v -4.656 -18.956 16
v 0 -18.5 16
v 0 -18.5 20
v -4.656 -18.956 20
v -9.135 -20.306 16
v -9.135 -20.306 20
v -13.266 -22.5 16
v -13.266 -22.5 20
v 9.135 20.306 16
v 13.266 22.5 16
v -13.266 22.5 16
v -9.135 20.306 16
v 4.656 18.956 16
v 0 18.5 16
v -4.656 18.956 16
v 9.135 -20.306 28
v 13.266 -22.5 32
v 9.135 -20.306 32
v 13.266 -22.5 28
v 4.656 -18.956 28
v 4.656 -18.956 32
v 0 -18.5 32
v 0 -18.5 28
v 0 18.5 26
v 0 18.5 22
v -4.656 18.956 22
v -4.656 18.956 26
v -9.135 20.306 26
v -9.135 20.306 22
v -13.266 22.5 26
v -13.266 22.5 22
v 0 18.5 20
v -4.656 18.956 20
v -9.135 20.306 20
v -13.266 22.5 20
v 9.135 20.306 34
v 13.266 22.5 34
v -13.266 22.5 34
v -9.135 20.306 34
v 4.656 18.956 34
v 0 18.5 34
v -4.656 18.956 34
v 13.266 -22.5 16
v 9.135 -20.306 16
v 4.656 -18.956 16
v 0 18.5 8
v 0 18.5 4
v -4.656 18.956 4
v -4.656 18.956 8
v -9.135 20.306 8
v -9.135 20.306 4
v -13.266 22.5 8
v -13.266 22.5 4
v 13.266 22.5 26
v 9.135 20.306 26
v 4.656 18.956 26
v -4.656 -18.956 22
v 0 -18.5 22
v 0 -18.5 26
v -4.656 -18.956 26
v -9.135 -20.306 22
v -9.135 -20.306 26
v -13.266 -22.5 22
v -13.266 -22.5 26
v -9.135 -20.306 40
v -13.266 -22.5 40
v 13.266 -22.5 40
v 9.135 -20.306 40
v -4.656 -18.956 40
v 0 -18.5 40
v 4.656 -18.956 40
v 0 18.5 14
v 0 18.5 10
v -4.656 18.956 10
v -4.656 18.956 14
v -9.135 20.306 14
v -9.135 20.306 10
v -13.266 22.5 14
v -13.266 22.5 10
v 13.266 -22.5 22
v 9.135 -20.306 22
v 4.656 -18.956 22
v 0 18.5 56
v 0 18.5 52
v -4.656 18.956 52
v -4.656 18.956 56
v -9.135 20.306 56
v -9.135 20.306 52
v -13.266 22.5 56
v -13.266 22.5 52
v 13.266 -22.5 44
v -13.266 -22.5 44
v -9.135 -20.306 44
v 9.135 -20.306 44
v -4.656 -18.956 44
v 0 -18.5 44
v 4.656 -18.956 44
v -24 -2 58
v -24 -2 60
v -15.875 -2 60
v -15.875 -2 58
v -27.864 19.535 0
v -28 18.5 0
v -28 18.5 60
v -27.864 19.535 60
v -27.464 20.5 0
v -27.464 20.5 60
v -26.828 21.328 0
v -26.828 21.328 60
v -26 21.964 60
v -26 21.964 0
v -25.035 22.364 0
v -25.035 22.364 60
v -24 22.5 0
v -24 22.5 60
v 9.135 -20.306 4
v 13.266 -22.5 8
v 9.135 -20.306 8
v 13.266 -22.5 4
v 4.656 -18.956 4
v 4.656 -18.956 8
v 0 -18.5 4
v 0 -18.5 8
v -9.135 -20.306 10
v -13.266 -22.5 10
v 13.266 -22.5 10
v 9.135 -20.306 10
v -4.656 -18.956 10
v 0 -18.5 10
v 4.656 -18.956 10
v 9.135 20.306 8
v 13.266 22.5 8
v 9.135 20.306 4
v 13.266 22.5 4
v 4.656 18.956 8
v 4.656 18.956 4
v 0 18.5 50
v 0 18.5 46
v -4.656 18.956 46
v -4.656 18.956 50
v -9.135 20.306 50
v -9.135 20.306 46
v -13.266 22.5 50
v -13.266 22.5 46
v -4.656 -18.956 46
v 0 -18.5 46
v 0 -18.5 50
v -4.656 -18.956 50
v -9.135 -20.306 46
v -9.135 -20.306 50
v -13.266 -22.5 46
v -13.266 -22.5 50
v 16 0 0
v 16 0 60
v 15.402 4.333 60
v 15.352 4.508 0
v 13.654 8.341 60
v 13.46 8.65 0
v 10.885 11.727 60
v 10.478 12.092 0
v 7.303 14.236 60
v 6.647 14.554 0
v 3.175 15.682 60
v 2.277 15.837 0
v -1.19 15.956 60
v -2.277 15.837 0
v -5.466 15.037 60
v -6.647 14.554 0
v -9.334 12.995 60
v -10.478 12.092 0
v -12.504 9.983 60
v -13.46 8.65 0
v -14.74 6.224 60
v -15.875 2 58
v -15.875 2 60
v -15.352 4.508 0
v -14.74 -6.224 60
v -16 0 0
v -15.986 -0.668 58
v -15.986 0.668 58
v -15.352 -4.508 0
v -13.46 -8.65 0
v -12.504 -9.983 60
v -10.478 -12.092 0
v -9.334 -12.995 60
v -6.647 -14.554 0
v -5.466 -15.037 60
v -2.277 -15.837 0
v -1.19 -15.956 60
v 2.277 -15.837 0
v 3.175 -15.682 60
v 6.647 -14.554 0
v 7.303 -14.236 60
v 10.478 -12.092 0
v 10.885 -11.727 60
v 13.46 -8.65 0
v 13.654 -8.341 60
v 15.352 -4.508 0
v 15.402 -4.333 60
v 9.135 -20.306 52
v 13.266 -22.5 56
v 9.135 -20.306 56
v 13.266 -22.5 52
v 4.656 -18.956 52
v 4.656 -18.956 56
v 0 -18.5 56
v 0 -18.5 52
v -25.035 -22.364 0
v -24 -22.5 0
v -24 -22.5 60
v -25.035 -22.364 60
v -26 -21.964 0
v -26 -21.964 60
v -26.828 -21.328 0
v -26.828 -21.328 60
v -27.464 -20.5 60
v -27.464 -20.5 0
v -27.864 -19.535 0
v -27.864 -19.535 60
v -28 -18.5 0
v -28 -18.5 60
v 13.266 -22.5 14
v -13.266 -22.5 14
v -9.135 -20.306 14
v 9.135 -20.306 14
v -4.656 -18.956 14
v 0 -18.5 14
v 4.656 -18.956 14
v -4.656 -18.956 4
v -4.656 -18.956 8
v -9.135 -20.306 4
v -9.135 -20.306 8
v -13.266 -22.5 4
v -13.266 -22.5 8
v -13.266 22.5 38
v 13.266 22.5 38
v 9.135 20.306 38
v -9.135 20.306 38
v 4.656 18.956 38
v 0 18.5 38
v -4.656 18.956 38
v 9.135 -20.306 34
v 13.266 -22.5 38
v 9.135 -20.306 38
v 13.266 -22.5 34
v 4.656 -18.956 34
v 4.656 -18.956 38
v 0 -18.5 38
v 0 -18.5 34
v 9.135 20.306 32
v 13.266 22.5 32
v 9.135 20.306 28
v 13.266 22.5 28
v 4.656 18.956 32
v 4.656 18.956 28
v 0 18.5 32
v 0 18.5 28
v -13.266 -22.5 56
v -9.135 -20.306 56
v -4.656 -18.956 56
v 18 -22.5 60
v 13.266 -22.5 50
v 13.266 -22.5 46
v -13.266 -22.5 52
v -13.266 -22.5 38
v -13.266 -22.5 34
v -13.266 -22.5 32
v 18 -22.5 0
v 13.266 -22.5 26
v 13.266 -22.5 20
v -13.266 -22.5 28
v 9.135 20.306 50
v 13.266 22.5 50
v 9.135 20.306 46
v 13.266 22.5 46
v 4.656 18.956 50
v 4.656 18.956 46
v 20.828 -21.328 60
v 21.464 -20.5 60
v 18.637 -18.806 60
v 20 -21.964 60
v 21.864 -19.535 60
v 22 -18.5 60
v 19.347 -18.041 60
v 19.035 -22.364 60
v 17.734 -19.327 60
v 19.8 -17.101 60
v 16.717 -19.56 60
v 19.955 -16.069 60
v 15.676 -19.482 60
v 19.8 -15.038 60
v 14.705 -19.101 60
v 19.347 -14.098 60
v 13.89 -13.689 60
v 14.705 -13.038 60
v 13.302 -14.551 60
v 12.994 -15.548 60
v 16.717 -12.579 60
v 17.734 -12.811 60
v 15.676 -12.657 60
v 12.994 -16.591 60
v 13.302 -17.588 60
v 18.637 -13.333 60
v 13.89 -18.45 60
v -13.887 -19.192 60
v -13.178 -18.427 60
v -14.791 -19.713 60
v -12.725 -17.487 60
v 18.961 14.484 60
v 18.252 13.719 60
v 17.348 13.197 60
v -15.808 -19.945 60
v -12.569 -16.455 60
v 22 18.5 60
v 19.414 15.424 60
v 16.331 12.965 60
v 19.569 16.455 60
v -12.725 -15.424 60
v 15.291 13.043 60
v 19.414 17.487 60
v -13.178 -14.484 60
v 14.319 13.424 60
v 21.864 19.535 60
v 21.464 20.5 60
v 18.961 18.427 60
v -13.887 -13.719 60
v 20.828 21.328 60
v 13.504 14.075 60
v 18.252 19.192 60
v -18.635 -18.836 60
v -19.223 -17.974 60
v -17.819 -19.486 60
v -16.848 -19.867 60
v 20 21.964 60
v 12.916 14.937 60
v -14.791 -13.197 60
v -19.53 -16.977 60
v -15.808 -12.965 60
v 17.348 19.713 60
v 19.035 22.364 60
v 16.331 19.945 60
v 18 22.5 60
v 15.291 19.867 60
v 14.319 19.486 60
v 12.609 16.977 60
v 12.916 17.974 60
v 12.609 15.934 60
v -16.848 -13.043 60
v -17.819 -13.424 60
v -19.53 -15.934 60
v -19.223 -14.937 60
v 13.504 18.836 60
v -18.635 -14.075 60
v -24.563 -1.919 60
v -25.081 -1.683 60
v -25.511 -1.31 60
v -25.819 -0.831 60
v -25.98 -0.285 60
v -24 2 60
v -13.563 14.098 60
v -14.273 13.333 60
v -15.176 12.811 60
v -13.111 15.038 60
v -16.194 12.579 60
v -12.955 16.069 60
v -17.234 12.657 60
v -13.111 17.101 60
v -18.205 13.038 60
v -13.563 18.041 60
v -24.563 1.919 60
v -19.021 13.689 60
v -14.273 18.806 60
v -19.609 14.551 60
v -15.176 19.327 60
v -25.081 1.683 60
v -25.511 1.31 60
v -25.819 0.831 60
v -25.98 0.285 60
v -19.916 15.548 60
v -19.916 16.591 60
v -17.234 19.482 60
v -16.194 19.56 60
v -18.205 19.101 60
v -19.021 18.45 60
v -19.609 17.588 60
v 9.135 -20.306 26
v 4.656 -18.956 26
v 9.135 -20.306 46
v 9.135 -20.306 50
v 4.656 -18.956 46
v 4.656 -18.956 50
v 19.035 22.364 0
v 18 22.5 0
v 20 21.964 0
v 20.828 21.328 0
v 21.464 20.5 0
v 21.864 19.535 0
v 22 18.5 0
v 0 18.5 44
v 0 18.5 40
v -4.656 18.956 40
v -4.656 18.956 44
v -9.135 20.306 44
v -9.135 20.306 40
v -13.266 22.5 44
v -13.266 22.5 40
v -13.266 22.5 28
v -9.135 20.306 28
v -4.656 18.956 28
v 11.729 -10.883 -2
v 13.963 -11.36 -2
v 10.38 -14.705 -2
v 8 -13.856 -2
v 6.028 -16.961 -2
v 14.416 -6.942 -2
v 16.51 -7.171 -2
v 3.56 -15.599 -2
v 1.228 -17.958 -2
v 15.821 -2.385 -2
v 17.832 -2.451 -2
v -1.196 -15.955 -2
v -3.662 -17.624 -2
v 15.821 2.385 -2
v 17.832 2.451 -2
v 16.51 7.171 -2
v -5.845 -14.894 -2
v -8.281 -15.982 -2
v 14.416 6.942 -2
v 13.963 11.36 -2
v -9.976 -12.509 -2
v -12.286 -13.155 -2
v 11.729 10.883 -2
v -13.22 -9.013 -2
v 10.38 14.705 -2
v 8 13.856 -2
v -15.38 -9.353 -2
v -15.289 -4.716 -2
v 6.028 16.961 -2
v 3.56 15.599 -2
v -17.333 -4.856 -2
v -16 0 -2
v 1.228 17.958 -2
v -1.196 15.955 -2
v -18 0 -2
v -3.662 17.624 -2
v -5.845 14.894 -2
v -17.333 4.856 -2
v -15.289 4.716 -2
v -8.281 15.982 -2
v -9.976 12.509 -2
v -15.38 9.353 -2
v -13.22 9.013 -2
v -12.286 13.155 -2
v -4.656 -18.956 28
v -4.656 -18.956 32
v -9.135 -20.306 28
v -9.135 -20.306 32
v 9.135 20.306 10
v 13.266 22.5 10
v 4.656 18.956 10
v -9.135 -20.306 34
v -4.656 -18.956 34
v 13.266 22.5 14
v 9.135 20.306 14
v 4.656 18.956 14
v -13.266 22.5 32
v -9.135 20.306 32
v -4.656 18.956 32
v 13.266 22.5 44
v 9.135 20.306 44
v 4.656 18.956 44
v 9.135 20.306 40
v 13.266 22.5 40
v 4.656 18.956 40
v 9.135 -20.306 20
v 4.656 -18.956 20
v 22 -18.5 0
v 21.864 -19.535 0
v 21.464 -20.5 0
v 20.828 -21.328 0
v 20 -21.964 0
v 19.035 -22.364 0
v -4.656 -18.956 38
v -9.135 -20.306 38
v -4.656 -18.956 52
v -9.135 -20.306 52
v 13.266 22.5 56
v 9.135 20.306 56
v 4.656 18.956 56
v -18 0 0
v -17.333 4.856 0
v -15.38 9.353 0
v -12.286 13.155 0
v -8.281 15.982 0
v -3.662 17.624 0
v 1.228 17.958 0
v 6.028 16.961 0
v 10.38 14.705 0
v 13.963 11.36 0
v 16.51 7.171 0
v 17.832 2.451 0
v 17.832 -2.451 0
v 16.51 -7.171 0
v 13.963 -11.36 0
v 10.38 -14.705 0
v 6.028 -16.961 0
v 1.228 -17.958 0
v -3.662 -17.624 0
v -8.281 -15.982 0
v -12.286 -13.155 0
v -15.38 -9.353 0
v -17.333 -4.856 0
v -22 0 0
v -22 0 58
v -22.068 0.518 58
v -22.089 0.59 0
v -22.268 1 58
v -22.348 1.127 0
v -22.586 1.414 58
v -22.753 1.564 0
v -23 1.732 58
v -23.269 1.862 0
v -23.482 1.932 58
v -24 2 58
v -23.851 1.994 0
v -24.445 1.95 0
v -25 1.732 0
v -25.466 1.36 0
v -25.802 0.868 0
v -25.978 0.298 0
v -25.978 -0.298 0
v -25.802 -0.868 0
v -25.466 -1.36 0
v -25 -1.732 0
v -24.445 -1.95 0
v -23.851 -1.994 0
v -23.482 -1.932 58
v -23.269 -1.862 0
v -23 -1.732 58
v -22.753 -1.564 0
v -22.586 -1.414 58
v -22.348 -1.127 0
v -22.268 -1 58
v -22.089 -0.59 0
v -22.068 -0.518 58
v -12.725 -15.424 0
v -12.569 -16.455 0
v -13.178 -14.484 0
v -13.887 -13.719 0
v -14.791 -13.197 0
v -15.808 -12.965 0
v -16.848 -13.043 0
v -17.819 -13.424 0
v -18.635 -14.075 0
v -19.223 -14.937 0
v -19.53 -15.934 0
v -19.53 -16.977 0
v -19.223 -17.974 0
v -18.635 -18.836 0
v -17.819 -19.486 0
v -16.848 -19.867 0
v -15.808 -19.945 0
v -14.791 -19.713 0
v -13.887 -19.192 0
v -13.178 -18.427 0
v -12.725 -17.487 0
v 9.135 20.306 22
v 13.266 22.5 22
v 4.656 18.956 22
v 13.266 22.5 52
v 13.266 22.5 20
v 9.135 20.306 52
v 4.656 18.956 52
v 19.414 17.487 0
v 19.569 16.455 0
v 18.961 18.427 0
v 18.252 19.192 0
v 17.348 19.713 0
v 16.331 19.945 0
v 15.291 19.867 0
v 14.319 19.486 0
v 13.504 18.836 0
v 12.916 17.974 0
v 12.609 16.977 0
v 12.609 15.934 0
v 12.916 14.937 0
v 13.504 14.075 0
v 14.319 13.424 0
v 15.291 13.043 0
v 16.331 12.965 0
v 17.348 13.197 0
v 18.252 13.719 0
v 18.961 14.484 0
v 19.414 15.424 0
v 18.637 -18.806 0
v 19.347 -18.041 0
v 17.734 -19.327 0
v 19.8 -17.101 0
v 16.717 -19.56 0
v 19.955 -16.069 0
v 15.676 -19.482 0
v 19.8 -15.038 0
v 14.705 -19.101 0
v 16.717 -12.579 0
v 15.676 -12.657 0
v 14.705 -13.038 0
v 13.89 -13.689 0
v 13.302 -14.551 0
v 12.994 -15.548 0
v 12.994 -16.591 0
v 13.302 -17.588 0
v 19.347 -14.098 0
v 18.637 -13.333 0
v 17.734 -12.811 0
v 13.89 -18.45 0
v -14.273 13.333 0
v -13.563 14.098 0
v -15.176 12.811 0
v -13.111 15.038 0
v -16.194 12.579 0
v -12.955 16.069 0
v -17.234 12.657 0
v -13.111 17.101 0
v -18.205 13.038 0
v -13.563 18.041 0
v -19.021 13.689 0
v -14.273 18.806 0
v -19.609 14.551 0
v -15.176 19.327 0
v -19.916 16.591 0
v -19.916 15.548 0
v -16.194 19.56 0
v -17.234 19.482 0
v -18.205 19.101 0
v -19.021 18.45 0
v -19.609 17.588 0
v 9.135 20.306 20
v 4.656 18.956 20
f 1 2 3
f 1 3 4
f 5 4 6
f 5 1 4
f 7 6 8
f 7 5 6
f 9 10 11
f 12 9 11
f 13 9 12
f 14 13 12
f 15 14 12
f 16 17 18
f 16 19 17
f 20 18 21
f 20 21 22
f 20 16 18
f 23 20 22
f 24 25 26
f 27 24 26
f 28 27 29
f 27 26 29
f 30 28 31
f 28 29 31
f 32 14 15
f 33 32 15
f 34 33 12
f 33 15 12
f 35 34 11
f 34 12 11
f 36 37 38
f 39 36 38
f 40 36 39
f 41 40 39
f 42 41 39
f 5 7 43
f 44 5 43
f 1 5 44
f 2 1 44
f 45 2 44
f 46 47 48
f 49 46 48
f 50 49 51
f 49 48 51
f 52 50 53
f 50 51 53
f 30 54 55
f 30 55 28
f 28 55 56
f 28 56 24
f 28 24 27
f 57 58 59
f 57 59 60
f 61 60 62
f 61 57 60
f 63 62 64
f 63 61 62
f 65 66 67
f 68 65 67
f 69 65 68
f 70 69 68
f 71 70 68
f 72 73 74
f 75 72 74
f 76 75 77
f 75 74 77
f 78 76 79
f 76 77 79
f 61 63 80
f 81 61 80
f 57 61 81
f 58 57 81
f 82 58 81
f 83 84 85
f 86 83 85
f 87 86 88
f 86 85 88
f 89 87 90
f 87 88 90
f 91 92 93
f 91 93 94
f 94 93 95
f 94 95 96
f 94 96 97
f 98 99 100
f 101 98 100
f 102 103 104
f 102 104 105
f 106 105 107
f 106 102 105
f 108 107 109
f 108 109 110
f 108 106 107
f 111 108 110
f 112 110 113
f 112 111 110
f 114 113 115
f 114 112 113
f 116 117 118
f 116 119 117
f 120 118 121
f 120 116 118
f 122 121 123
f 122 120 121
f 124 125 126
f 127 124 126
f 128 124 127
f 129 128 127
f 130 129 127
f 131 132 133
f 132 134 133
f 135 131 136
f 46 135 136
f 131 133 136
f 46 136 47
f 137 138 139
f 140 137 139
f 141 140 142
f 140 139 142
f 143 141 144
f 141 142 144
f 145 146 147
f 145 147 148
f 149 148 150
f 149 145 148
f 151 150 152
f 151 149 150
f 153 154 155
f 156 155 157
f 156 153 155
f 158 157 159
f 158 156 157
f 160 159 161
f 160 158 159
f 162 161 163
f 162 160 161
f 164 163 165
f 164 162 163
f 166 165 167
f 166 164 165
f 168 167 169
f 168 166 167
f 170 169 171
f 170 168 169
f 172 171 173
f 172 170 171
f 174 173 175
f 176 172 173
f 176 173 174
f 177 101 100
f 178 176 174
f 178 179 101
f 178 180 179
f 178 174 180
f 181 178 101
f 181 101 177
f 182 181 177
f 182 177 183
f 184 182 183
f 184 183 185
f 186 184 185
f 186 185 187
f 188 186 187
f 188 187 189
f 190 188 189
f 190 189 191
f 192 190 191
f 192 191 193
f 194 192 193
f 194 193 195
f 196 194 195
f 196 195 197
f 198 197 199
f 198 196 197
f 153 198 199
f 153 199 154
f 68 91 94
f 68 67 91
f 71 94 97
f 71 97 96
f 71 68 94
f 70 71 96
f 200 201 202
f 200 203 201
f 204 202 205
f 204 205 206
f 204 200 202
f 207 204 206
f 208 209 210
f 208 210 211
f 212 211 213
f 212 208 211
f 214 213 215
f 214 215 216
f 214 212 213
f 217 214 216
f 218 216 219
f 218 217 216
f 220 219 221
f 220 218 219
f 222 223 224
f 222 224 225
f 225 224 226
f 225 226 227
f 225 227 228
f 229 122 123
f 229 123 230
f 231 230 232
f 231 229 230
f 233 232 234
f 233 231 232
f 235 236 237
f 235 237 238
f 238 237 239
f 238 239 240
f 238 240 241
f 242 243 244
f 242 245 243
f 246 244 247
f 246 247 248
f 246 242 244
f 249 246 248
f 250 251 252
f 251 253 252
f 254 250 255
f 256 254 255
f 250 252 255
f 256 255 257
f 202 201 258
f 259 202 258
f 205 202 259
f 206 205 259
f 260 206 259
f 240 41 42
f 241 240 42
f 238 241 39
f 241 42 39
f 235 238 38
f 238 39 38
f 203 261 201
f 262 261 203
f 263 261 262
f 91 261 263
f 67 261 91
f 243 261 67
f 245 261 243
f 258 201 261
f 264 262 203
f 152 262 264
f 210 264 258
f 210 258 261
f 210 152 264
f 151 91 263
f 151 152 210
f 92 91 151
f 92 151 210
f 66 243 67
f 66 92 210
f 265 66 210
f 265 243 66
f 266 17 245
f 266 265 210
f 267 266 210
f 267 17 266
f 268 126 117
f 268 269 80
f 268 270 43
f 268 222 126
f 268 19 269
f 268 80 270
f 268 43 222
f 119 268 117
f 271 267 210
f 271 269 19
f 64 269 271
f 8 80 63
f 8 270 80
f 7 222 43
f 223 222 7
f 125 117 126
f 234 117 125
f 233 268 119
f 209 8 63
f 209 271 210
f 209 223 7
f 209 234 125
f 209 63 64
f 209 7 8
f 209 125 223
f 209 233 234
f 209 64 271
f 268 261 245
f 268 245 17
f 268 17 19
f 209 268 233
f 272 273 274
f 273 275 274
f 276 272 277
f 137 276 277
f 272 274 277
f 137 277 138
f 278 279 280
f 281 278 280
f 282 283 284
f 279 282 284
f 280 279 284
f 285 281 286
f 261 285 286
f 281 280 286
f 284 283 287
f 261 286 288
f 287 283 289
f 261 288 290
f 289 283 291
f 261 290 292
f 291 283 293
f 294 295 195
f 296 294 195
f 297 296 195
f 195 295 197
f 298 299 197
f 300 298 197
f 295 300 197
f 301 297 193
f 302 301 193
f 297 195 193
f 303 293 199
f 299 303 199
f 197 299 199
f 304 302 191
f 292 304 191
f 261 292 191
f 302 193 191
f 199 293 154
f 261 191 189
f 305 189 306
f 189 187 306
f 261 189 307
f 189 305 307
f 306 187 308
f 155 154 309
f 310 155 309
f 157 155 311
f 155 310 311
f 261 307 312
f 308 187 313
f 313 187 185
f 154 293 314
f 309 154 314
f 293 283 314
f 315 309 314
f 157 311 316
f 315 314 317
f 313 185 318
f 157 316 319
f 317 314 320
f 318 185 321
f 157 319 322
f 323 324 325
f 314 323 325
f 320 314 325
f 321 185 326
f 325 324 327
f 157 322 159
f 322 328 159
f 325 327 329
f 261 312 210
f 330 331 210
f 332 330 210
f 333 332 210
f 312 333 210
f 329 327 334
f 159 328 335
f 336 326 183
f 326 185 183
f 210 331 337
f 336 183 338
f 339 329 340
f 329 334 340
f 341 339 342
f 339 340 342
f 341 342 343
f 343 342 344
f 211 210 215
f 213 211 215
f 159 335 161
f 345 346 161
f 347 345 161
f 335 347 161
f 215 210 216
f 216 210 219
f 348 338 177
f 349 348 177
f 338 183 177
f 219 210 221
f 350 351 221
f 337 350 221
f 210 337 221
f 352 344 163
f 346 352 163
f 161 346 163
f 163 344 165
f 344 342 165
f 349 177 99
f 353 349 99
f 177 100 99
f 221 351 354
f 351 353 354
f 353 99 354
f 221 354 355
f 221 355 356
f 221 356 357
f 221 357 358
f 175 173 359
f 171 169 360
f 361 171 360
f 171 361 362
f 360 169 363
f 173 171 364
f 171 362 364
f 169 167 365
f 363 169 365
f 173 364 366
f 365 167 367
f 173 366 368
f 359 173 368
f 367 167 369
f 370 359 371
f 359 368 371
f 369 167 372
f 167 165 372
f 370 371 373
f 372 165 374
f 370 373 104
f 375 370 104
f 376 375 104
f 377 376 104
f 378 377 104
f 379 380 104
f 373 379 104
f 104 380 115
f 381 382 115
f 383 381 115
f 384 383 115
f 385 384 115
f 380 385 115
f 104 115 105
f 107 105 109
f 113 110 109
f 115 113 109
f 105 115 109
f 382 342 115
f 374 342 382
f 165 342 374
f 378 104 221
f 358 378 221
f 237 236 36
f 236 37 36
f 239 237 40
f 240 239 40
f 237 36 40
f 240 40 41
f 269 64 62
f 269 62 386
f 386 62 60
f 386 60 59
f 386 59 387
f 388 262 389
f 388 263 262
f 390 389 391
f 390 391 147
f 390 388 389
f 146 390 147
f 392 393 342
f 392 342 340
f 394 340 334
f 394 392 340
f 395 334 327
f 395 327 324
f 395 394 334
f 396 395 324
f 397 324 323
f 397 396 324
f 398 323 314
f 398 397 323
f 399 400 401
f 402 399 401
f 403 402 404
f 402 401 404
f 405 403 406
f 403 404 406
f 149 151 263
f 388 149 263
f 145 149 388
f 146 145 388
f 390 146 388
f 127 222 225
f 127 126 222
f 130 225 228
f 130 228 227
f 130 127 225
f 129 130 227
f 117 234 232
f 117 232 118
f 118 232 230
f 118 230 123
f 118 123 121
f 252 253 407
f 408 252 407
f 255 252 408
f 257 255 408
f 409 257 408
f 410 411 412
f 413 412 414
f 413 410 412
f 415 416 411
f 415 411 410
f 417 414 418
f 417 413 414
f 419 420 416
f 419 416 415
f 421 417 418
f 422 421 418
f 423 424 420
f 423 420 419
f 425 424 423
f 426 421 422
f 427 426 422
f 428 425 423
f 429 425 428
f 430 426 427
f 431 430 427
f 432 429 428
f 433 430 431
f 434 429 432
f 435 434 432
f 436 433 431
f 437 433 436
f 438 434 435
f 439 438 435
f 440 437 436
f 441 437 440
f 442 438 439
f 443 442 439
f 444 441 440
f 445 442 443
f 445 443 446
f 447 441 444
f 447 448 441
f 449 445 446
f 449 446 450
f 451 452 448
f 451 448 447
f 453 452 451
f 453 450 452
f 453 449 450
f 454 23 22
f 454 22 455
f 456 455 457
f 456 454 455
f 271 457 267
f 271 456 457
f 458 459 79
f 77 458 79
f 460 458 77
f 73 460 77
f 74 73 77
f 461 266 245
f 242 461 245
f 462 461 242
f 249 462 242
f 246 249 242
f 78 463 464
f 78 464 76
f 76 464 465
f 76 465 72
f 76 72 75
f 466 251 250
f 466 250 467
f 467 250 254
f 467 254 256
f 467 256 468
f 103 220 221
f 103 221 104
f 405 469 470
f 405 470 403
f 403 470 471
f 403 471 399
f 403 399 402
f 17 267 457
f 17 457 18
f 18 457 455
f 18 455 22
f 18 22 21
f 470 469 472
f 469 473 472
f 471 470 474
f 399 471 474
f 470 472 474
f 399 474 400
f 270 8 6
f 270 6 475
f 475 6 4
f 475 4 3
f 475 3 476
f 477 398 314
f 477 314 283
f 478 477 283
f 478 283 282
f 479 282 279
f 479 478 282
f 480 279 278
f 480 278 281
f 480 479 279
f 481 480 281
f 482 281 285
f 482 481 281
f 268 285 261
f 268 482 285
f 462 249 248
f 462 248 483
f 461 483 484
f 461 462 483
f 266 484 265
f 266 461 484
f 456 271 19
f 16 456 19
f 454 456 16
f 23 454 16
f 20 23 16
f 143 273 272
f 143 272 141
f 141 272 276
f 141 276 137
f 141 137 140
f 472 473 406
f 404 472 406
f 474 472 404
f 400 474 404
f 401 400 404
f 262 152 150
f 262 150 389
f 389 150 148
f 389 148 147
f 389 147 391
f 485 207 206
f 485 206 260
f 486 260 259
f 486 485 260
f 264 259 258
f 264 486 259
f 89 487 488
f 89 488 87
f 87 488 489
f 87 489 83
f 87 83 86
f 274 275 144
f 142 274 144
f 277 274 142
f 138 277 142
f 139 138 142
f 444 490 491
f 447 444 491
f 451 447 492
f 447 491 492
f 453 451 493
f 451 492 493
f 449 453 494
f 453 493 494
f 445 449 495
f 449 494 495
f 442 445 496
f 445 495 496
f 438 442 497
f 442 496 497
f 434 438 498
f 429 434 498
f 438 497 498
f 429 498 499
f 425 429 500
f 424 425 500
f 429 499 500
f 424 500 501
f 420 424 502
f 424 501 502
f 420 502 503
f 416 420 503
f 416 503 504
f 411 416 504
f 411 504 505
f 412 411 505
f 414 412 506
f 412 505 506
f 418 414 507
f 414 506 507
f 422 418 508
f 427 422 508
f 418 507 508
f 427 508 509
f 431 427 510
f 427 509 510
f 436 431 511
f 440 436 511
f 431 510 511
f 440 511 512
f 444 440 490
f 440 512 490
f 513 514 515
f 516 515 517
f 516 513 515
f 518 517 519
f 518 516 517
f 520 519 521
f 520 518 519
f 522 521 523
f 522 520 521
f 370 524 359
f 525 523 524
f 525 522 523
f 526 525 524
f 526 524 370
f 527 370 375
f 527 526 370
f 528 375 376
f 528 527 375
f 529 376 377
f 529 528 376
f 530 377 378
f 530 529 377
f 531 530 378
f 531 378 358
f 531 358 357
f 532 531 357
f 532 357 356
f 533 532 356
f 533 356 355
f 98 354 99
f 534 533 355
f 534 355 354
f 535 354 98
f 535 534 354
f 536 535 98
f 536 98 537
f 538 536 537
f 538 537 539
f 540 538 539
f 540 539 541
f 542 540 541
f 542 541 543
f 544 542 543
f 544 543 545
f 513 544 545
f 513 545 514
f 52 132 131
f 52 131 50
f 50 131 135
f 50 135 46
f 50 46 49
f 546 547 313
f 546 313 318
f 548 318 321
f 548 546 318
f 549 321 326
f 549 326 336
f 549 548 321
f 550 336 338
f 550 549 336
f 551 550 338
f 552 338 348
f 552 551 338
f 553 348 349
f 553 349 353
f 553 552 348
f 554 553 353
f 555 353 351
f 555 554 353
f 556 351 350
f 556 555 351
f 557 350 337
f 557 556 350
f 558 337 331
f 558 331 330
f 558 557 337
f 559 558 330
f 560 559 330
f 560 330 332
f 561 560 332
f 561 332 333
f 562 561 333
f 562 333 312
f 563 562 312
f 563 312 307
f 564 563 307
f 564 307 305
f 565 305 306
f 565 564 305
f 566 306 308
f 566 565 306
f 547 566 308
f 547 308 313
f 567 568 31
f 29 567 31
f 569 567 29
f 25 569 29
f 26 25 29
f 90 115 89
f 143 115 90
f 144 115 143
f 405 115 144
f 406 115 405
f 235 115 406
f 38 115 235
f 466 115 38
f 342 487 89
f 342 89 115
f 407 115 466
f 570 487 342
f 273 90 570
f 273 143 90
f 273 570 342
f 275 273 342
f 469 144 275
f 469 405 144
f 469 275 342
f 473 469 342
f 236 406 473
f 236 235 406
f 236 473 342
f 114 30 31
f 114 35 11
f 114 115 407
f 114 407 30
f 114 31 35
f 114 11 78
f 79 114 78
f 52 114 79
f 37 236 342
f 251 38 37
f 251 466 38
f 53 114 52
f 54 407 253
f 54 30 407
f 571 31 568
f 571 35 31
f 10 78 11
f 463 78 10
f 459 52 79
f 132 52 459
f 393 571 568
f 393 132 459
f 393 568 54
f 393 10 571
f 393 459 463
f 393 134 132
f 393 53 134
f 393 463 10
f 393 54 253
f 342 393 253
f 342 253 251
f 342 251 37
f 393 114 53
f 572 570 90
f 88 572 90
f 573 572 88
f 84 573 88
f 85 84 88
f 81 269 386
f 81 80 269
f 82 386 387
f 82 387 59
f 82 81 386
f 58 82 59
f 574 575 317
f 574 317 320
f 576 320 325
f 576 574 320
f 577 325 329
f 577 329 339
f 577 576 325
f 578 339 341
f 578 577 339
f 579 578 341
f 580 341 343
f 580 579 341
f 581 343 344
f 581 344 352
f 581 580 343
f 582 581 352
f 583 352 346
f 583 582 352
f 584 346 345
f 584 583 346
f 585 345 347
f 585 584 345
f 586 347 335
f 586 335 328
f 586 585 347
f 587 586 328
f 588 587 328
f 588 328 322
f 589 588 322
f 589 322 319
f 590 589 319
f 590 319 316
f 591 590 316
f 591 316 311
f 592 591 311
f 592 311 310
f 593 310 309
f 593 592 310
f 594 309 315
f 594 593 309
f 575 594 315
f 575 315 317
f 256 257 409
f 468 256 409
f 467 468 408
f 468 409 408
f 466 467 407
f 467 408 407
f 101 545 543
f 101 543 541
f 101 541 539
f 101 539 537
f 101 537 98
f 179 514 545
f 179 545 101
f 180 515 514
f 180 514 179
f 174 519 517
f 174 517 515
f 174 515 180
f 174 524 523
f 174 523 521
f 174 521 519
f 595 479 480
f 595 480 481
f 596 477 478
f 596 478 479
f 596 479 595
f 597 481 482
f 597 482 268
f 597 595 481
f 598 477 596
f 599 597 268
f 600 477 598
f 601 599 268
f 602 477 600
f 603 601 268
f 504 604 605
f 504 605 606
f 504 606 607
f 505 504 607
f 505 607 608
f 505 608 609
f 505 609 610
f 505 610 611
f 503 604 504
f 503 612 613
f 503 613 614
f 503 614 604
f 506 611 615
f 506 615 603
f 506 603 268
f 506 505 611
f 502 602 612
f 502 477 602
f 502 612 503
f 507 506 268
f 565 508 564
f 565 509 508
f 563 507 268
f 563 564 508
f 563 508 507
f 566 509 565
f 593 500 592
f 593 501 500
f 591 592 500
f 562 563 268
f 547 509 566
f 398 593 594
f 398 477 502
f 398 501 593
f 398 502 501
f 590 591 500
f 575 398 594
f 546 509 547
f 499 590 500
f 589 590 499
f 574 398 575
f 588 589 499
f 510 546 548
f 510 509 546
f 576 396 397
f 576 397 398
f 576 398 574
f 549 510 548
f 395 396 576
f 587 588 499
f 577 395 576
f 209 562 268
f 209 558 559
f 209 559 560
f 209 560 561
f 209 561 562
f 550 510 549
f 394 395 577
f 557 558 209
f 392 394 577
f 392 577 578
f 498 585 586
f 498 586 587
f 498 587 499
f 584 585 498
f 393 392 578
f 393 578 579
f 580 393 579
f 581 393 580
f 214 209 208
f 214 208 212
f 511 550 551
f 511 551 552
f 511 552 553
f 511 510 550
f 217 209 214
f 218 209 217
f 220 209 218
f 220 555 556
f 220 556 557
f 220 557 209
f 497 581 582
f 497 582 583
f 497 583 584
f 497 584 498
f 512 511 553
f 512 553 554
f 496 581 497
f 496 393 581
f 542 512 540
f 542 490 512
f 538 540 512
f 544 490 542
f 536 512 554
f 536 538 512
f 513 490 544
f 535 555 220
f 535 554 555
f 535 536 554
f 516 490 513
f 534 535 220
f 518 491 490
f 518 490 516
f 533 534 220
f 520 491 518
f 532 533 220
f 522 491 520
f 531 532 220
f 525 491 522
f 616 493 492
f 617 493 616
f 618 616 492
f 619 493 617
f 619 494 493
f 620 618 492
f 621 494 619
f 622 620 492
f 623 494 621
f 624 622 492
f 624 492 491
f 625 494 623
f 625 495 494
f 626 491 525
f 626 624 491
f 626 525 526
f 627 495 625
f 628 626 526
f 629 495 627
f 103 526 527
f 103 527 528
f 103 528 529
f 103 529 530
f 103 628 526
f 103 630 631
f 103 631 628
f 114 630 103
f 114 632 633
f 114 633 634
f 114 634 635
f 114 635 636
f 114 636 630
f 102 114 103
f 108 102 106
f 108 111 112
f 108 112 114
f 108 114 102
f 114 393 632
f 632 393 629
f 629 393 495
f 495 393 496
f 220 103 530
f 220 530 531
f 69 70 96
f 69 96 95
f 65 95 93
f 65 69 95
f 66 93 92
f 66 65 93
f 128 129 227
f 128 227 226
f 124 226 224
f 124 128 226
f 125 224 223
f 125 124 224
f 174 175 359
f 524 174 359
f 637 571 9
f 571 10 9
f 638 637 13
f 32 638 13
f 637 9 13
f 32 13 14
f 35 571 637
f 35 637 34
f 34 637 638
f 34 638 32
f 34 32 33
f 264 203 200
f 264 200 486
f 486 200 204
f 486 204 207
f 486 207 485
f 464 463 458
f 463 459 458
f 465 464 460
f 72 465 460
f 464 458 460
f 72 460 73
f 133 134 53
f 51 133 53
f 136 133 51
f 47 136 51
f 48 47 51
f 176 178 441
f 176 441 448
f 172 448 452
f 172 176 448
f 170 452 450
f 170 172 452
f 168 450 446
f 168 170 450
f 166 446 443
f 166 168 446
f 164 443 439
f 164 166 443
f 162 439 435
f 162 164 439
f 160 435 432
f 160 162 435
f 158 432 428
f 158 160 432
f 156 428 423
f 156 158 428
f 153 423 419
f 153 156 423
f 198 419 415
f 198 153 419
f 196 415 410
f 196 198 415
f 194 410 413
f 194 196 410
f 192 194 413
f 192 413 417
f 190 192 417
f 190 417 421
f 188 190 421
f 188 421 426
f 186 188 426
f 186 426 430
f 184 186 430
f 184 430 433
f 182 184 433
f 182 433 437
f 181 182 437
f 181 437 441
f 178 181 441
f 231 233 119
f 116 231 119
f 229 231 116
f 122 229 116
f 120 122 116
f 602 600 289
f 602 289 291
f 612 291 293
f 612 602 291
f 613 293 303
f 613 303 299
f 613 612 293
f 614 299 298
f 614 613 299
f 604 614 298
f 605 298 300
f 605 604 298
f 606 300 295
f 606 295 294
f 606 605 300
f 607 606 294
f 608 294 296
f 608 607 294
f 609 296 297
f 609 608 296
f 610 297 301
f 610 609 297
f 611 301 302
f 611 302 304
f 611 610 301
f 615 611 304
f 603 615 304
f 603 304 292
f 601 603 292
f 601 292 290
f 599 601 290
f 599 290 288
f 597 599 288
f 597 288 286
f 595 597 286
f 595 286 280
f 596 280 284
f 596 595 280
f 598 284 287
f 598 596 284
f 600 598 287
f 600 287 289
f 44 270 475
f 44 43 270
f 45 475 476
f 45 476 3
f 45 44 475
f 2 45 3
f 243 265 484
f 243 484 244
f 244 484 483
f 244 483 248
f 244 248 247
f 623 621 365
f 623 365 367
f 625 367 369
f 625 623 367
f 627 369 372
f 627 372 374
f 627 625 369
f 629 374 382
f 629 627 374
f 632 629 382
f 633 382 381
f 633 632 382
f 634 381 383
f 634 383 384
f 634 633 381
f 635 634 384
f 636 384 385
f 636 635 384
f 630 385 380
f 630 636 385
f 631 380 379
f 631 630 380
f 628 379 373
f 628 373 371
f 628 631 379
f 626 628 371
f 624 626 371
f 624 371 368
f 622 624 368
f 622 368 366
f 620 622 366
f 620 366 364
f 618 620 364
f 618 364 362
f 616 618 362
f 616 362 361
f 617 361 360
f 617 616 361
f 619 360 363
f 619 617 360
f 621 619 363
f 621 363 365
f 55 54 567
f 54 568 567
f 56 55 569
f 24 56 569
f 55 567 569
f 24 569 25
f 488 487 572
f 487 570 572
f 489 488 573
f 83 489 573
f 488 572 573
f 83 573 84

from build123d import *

# Parameters (mm, degrees)
SKETCH1_R               = 16
SKETCH1_R_2             = 3.5
SKETCH1_R_3             = 2
BOSS_EXTRUDE1_DEPTH     = 60
SKETCH2_R               = 18
SKETCH2_R_2             = 16
BOSS_EXTRUDE2_DEPTH     = 2
CUT_EXTRUDE1_DEPTH      = 2
SKETCH6_W               = 4
SKETCH6_H               = 24
LPATTERN1_COUNT         = 9
LPATTERN1_PITCH         = 6
MIRROR1_COPY_1_SKETCH_W = 4
MIRROR1_COPY_1_SKETCH_H = 24
MIRROR1_COPY_2_SKETCH_W = 4
MIRROR1_COPY_2_SKETCH_H = 24
MIRROR1_COPY_3_SKETCH_W = 4
MIRROR1_COPY_3_SKETCH_H = 24
MIRROR1_COPY_4_SKETCH_W = 4
MIRROR1_COPY_4_SKETCH_H = 24
MIRROR1_COPY_5_SKETCH_W = 4
MIRROR1_COPY_5_SKETCH_H = 24
MIRROR1_COPY_6_SKETCH_W = 4
MIRROR1_COPY_6_SKETCH_H = 24
MIRROR1_COPY_7_SKETCH_W = 4
MIRROR1_COPY_7_SKETCH_H = 24
MIRROR1_COPY_8_SKETCH_W = 4
MIRROR1_COPY_8_SKETCH_H = 24


with BuildPart() as part:
    # Sketch1 → Boss-Extrude1 (new body)
    with BuildSketch(Plane.XY):
        with BuildLine():
            Line((-24, 22.5), (18, 22.5))
            ThreePointArc((18, 22.5), (20.828427125, 21.328427125), (22, 18.5))
            Line((22, 18.5), (22, -18.5))
            ThreePointArc((22, -18.5), (20.828427125, -21.328427125), (18, -22.5))
            Line((18, -22.5), (-24, -22.5))
            ThreePointArc((-24, -22.5), (-26.828427125, -21.328427125), (-28, -18.5))
            Line((-28, -18.5), (-28, 18.5))
            ThreePointArc((-28, 18.5), (-26.828427125, 21.328427125), (-24, 22.5))
        make_face()
        Circle(SKETCH1_R, mode=Mode.SUBTRACT)
        with Locations((16.069433567, 16.455190818)):
            Circle(SKETCH1_R_2, mode=Mode.SUBTRACT)
        with Locations((16.455190818, -16.069433567)):
            Circle(SKETCH1_R_2, mode=Mode.SUBTRACT)
        with Locations((-16.069433567, -16.455190818)):
            Circle(SKETCH1_R_2, mode=Mode.SUBTRACT)
        with Locations((-16.455190818, 16.069433567)):
            Circle(SKETCH1_R_2, mode=Mode.SUBTRACT)
        with Locations((-24, 0)):
            Circle(SKETCH1_R_3, mode=Mode.SUBTRACT)
    extrude(amount=BOSS_EXTRUDE1_DEPTH)

    # Sketch2 → Boss-Extrude2 (add)
    with BuildSketch(Plane(origin=(0, 0, 0), x_dir=(-1, 0, 0), z_dir=(0, 0, -1))):
        Circle(SKETCH2_R)
        Circle(SKETCH2_R_2, mode=Mode.SUBTRACT)
    extrude(amount=BOSS_EXTRUDE2_DEPTH)

    # Sketch3 → Cut-Extrude1 (cut)
    with BuildSketch(Plane.XY.offset(60)):
        with BuildLine():
            Line((-24, -2), (-15.874507866, -2))
            ThreePointArc((-15.874507866, -2), (-16, 0), (-15.874507866, 2))
            Line((-15.874507866, 2), (-24, 2))
            ThreePointArc((-24, 2), (-22.585786438, 1.414213562), (-22, 0))
            ThreePointArc((-22, 0), (-22.585786438, -1.414213562), (-24, -2))
        make_face()
    extrude(amount=-CUT_EXTRUDE1_DEPTH, mode=Mode.SUBTRACT)

    # Sketch6 → Cut-Revolve1 (revolve, cut)
    with BuildSketch(Plane(origin=(0, 0, 0), x_dir=(0, 0, -1), z_dir=(1, 0, 0))):
        with Locations((-54, 30.5)):
            Rectangle(SKETCH6_W, SKETCH6_H)
    cut_revolve1 = revolve(axis=Axis((0, 42.5, 56), (0, 0, -1)), mode=Mode.SUBTRACT)

    # LPattern1: Cut-Revolve1 ×9
    with Locations(*[(0, 0, -i * LPATTERN1_PITCH) for i in range(1, LPATTERN1_COUNT)]):
        add(cut_revolve1, mode=Mode.SUBTRACT)

    # Mirror1: Cut-Revolve1 across plane
    add(cut_revolve1.mirror(Plane.ZX), mode=Mode.SUBTRACT)

    # Mirror1 copy 1 sketch → Mirror1 copy 1 (revolve, cut)
    with BuildSketch(Plane(origin=(0, 0, -6), x_dir=(0, 0, -1), z_dir=(1, 0, 0))):
        with Locations((-54, -30.5)):
            Rectangle(MIRROR1_COPY_1_SKETCH_W, MIRROR1_COPY_1_SKETCH_H)
    revolve(axis=Axis((0, -42.5, 50), (0, 0, 1)), mode=Mode.SUBTRACT)

    # Mirror1 copy 2 sketch → Mirror1 copy 2 (revolve, cut)
    with BuildSketch(Plane(origin=(0, 0, -12), x_dir=(0, 0, -1), z_dir=(1, 0, 0))):
        with Locations((-54, -30.5)):
            Rectangle(MIRROR1_COPY_2_SKETCH_W, MIRROR1_COPY_2_SKETCH_H)
    revolve(axis=Axis((0, -42.5, 44), (0, 0, 1)), mode=Mode.SUBTRACT)

    # Mirror1 copy 3 sketch → Mirror1 copy 3 (revolve, cut)
    with BuildSketch(Plane(origin=(0, 0, -18), x_dir=(0, 0, -1), z_dir=(1, 0, 0))):
        with Locations((-54, -30.5)):
            Rectangle(MIRROR1_COPY_3_SKETCH_W, MIRROR1_COPY_3_SKETCH_H)
    revolve(axis=Axis((0, -42.5, 38), (0, 0, 1)), mode=Mode.SUBTRACT)

    # Mirror1 copy 4 sketch → Mirror1 copy 4 (revolve, cut)
    with BuildSketch(Plane(origin=(0, 0, -24), x_dir=(0, 0, -1), z_dir=(1, 0, 0))):
        with Locations((-54, -30.5)):
            Rectangle(MIRROR1_COPY_4_SKETCH_W, MIRROR1_COPY_4_SKETCH_H)
    revolve(axis=Axis((0, -42.5, 32), (0, 0, 1)), mode=Mode.SUBTRACT)

    # Mirror1 copy 5 sketch → Mirror1 copy 5 (revolve, cut)
    with BuildSketch(Plane(origin=(0, 0, -30), x_dir=(0, 0, -1), z_dir=(1, 0, 0))):
        with Locations((-54, -30.5)):
            Rectangle(MIRROR1_COPY_5_SKETCH_W, MIRROR1_COPY_5_SKETCH_H)
    revolve(axis=Axis((0, -42.5, 26), (0, 0, 1)), mode=Mode.SUBTRACT)

    # Mirror1 copy 6 sketch → Mirror1 copy 6 (revolve, cut)
    with BuildSketch(Plane(origin=(0, 0, -36), x_dir=(0, 0, -1), z_dir=(1, 0, 0))):
        with Locations((-54, -30.5)):
            Rectangle(MIRROR1_COPY_6_SKETCH_W, MIRROR1_COPY_6_SKETCH_H)
    revolve(axis=Axis((0, -42.5, 20), (0, 0, 1)), mode=Mode.SUBTRACT)

    # Mirror1 copy 7 sketch → Mirror1 copy 7 (revolve, cut)
    with BuildSketch(Plane(origin=(0, 0, -42), x_dir=(0, 0, -1), z_dir=(1, 0, 0))):
        with Locations((-54, -30.5)):
            Rectangle(MIRROR1_COPY_7_SKETCH_W, MIRROR1_COPY_7_SKETCH_H)
    revolve(axis=Axis((0, -42.5, 14), (0, 0, 1)), mode=Mode.SUBTRACT)

    # Mirror1 copy 8 sketch → Mirror1 copy 8 (revolve, cut)
    with BuildSketch(Plane(origin=(0, 0, -48), x_dir=(0, 0, -1), z_dir=(1, 0, 0))):
        with Locations((-54, -30.5)):
            Rectangle(MIRROR1_COPY_8_SKETCH_W, MIRROR1_COPY_8_SKETCH_H)
    revolve(axis=Axis((0, -42.5, 8), (0, 0, 1)), mode=Mode.SUBTRACT)


solid = part.part
